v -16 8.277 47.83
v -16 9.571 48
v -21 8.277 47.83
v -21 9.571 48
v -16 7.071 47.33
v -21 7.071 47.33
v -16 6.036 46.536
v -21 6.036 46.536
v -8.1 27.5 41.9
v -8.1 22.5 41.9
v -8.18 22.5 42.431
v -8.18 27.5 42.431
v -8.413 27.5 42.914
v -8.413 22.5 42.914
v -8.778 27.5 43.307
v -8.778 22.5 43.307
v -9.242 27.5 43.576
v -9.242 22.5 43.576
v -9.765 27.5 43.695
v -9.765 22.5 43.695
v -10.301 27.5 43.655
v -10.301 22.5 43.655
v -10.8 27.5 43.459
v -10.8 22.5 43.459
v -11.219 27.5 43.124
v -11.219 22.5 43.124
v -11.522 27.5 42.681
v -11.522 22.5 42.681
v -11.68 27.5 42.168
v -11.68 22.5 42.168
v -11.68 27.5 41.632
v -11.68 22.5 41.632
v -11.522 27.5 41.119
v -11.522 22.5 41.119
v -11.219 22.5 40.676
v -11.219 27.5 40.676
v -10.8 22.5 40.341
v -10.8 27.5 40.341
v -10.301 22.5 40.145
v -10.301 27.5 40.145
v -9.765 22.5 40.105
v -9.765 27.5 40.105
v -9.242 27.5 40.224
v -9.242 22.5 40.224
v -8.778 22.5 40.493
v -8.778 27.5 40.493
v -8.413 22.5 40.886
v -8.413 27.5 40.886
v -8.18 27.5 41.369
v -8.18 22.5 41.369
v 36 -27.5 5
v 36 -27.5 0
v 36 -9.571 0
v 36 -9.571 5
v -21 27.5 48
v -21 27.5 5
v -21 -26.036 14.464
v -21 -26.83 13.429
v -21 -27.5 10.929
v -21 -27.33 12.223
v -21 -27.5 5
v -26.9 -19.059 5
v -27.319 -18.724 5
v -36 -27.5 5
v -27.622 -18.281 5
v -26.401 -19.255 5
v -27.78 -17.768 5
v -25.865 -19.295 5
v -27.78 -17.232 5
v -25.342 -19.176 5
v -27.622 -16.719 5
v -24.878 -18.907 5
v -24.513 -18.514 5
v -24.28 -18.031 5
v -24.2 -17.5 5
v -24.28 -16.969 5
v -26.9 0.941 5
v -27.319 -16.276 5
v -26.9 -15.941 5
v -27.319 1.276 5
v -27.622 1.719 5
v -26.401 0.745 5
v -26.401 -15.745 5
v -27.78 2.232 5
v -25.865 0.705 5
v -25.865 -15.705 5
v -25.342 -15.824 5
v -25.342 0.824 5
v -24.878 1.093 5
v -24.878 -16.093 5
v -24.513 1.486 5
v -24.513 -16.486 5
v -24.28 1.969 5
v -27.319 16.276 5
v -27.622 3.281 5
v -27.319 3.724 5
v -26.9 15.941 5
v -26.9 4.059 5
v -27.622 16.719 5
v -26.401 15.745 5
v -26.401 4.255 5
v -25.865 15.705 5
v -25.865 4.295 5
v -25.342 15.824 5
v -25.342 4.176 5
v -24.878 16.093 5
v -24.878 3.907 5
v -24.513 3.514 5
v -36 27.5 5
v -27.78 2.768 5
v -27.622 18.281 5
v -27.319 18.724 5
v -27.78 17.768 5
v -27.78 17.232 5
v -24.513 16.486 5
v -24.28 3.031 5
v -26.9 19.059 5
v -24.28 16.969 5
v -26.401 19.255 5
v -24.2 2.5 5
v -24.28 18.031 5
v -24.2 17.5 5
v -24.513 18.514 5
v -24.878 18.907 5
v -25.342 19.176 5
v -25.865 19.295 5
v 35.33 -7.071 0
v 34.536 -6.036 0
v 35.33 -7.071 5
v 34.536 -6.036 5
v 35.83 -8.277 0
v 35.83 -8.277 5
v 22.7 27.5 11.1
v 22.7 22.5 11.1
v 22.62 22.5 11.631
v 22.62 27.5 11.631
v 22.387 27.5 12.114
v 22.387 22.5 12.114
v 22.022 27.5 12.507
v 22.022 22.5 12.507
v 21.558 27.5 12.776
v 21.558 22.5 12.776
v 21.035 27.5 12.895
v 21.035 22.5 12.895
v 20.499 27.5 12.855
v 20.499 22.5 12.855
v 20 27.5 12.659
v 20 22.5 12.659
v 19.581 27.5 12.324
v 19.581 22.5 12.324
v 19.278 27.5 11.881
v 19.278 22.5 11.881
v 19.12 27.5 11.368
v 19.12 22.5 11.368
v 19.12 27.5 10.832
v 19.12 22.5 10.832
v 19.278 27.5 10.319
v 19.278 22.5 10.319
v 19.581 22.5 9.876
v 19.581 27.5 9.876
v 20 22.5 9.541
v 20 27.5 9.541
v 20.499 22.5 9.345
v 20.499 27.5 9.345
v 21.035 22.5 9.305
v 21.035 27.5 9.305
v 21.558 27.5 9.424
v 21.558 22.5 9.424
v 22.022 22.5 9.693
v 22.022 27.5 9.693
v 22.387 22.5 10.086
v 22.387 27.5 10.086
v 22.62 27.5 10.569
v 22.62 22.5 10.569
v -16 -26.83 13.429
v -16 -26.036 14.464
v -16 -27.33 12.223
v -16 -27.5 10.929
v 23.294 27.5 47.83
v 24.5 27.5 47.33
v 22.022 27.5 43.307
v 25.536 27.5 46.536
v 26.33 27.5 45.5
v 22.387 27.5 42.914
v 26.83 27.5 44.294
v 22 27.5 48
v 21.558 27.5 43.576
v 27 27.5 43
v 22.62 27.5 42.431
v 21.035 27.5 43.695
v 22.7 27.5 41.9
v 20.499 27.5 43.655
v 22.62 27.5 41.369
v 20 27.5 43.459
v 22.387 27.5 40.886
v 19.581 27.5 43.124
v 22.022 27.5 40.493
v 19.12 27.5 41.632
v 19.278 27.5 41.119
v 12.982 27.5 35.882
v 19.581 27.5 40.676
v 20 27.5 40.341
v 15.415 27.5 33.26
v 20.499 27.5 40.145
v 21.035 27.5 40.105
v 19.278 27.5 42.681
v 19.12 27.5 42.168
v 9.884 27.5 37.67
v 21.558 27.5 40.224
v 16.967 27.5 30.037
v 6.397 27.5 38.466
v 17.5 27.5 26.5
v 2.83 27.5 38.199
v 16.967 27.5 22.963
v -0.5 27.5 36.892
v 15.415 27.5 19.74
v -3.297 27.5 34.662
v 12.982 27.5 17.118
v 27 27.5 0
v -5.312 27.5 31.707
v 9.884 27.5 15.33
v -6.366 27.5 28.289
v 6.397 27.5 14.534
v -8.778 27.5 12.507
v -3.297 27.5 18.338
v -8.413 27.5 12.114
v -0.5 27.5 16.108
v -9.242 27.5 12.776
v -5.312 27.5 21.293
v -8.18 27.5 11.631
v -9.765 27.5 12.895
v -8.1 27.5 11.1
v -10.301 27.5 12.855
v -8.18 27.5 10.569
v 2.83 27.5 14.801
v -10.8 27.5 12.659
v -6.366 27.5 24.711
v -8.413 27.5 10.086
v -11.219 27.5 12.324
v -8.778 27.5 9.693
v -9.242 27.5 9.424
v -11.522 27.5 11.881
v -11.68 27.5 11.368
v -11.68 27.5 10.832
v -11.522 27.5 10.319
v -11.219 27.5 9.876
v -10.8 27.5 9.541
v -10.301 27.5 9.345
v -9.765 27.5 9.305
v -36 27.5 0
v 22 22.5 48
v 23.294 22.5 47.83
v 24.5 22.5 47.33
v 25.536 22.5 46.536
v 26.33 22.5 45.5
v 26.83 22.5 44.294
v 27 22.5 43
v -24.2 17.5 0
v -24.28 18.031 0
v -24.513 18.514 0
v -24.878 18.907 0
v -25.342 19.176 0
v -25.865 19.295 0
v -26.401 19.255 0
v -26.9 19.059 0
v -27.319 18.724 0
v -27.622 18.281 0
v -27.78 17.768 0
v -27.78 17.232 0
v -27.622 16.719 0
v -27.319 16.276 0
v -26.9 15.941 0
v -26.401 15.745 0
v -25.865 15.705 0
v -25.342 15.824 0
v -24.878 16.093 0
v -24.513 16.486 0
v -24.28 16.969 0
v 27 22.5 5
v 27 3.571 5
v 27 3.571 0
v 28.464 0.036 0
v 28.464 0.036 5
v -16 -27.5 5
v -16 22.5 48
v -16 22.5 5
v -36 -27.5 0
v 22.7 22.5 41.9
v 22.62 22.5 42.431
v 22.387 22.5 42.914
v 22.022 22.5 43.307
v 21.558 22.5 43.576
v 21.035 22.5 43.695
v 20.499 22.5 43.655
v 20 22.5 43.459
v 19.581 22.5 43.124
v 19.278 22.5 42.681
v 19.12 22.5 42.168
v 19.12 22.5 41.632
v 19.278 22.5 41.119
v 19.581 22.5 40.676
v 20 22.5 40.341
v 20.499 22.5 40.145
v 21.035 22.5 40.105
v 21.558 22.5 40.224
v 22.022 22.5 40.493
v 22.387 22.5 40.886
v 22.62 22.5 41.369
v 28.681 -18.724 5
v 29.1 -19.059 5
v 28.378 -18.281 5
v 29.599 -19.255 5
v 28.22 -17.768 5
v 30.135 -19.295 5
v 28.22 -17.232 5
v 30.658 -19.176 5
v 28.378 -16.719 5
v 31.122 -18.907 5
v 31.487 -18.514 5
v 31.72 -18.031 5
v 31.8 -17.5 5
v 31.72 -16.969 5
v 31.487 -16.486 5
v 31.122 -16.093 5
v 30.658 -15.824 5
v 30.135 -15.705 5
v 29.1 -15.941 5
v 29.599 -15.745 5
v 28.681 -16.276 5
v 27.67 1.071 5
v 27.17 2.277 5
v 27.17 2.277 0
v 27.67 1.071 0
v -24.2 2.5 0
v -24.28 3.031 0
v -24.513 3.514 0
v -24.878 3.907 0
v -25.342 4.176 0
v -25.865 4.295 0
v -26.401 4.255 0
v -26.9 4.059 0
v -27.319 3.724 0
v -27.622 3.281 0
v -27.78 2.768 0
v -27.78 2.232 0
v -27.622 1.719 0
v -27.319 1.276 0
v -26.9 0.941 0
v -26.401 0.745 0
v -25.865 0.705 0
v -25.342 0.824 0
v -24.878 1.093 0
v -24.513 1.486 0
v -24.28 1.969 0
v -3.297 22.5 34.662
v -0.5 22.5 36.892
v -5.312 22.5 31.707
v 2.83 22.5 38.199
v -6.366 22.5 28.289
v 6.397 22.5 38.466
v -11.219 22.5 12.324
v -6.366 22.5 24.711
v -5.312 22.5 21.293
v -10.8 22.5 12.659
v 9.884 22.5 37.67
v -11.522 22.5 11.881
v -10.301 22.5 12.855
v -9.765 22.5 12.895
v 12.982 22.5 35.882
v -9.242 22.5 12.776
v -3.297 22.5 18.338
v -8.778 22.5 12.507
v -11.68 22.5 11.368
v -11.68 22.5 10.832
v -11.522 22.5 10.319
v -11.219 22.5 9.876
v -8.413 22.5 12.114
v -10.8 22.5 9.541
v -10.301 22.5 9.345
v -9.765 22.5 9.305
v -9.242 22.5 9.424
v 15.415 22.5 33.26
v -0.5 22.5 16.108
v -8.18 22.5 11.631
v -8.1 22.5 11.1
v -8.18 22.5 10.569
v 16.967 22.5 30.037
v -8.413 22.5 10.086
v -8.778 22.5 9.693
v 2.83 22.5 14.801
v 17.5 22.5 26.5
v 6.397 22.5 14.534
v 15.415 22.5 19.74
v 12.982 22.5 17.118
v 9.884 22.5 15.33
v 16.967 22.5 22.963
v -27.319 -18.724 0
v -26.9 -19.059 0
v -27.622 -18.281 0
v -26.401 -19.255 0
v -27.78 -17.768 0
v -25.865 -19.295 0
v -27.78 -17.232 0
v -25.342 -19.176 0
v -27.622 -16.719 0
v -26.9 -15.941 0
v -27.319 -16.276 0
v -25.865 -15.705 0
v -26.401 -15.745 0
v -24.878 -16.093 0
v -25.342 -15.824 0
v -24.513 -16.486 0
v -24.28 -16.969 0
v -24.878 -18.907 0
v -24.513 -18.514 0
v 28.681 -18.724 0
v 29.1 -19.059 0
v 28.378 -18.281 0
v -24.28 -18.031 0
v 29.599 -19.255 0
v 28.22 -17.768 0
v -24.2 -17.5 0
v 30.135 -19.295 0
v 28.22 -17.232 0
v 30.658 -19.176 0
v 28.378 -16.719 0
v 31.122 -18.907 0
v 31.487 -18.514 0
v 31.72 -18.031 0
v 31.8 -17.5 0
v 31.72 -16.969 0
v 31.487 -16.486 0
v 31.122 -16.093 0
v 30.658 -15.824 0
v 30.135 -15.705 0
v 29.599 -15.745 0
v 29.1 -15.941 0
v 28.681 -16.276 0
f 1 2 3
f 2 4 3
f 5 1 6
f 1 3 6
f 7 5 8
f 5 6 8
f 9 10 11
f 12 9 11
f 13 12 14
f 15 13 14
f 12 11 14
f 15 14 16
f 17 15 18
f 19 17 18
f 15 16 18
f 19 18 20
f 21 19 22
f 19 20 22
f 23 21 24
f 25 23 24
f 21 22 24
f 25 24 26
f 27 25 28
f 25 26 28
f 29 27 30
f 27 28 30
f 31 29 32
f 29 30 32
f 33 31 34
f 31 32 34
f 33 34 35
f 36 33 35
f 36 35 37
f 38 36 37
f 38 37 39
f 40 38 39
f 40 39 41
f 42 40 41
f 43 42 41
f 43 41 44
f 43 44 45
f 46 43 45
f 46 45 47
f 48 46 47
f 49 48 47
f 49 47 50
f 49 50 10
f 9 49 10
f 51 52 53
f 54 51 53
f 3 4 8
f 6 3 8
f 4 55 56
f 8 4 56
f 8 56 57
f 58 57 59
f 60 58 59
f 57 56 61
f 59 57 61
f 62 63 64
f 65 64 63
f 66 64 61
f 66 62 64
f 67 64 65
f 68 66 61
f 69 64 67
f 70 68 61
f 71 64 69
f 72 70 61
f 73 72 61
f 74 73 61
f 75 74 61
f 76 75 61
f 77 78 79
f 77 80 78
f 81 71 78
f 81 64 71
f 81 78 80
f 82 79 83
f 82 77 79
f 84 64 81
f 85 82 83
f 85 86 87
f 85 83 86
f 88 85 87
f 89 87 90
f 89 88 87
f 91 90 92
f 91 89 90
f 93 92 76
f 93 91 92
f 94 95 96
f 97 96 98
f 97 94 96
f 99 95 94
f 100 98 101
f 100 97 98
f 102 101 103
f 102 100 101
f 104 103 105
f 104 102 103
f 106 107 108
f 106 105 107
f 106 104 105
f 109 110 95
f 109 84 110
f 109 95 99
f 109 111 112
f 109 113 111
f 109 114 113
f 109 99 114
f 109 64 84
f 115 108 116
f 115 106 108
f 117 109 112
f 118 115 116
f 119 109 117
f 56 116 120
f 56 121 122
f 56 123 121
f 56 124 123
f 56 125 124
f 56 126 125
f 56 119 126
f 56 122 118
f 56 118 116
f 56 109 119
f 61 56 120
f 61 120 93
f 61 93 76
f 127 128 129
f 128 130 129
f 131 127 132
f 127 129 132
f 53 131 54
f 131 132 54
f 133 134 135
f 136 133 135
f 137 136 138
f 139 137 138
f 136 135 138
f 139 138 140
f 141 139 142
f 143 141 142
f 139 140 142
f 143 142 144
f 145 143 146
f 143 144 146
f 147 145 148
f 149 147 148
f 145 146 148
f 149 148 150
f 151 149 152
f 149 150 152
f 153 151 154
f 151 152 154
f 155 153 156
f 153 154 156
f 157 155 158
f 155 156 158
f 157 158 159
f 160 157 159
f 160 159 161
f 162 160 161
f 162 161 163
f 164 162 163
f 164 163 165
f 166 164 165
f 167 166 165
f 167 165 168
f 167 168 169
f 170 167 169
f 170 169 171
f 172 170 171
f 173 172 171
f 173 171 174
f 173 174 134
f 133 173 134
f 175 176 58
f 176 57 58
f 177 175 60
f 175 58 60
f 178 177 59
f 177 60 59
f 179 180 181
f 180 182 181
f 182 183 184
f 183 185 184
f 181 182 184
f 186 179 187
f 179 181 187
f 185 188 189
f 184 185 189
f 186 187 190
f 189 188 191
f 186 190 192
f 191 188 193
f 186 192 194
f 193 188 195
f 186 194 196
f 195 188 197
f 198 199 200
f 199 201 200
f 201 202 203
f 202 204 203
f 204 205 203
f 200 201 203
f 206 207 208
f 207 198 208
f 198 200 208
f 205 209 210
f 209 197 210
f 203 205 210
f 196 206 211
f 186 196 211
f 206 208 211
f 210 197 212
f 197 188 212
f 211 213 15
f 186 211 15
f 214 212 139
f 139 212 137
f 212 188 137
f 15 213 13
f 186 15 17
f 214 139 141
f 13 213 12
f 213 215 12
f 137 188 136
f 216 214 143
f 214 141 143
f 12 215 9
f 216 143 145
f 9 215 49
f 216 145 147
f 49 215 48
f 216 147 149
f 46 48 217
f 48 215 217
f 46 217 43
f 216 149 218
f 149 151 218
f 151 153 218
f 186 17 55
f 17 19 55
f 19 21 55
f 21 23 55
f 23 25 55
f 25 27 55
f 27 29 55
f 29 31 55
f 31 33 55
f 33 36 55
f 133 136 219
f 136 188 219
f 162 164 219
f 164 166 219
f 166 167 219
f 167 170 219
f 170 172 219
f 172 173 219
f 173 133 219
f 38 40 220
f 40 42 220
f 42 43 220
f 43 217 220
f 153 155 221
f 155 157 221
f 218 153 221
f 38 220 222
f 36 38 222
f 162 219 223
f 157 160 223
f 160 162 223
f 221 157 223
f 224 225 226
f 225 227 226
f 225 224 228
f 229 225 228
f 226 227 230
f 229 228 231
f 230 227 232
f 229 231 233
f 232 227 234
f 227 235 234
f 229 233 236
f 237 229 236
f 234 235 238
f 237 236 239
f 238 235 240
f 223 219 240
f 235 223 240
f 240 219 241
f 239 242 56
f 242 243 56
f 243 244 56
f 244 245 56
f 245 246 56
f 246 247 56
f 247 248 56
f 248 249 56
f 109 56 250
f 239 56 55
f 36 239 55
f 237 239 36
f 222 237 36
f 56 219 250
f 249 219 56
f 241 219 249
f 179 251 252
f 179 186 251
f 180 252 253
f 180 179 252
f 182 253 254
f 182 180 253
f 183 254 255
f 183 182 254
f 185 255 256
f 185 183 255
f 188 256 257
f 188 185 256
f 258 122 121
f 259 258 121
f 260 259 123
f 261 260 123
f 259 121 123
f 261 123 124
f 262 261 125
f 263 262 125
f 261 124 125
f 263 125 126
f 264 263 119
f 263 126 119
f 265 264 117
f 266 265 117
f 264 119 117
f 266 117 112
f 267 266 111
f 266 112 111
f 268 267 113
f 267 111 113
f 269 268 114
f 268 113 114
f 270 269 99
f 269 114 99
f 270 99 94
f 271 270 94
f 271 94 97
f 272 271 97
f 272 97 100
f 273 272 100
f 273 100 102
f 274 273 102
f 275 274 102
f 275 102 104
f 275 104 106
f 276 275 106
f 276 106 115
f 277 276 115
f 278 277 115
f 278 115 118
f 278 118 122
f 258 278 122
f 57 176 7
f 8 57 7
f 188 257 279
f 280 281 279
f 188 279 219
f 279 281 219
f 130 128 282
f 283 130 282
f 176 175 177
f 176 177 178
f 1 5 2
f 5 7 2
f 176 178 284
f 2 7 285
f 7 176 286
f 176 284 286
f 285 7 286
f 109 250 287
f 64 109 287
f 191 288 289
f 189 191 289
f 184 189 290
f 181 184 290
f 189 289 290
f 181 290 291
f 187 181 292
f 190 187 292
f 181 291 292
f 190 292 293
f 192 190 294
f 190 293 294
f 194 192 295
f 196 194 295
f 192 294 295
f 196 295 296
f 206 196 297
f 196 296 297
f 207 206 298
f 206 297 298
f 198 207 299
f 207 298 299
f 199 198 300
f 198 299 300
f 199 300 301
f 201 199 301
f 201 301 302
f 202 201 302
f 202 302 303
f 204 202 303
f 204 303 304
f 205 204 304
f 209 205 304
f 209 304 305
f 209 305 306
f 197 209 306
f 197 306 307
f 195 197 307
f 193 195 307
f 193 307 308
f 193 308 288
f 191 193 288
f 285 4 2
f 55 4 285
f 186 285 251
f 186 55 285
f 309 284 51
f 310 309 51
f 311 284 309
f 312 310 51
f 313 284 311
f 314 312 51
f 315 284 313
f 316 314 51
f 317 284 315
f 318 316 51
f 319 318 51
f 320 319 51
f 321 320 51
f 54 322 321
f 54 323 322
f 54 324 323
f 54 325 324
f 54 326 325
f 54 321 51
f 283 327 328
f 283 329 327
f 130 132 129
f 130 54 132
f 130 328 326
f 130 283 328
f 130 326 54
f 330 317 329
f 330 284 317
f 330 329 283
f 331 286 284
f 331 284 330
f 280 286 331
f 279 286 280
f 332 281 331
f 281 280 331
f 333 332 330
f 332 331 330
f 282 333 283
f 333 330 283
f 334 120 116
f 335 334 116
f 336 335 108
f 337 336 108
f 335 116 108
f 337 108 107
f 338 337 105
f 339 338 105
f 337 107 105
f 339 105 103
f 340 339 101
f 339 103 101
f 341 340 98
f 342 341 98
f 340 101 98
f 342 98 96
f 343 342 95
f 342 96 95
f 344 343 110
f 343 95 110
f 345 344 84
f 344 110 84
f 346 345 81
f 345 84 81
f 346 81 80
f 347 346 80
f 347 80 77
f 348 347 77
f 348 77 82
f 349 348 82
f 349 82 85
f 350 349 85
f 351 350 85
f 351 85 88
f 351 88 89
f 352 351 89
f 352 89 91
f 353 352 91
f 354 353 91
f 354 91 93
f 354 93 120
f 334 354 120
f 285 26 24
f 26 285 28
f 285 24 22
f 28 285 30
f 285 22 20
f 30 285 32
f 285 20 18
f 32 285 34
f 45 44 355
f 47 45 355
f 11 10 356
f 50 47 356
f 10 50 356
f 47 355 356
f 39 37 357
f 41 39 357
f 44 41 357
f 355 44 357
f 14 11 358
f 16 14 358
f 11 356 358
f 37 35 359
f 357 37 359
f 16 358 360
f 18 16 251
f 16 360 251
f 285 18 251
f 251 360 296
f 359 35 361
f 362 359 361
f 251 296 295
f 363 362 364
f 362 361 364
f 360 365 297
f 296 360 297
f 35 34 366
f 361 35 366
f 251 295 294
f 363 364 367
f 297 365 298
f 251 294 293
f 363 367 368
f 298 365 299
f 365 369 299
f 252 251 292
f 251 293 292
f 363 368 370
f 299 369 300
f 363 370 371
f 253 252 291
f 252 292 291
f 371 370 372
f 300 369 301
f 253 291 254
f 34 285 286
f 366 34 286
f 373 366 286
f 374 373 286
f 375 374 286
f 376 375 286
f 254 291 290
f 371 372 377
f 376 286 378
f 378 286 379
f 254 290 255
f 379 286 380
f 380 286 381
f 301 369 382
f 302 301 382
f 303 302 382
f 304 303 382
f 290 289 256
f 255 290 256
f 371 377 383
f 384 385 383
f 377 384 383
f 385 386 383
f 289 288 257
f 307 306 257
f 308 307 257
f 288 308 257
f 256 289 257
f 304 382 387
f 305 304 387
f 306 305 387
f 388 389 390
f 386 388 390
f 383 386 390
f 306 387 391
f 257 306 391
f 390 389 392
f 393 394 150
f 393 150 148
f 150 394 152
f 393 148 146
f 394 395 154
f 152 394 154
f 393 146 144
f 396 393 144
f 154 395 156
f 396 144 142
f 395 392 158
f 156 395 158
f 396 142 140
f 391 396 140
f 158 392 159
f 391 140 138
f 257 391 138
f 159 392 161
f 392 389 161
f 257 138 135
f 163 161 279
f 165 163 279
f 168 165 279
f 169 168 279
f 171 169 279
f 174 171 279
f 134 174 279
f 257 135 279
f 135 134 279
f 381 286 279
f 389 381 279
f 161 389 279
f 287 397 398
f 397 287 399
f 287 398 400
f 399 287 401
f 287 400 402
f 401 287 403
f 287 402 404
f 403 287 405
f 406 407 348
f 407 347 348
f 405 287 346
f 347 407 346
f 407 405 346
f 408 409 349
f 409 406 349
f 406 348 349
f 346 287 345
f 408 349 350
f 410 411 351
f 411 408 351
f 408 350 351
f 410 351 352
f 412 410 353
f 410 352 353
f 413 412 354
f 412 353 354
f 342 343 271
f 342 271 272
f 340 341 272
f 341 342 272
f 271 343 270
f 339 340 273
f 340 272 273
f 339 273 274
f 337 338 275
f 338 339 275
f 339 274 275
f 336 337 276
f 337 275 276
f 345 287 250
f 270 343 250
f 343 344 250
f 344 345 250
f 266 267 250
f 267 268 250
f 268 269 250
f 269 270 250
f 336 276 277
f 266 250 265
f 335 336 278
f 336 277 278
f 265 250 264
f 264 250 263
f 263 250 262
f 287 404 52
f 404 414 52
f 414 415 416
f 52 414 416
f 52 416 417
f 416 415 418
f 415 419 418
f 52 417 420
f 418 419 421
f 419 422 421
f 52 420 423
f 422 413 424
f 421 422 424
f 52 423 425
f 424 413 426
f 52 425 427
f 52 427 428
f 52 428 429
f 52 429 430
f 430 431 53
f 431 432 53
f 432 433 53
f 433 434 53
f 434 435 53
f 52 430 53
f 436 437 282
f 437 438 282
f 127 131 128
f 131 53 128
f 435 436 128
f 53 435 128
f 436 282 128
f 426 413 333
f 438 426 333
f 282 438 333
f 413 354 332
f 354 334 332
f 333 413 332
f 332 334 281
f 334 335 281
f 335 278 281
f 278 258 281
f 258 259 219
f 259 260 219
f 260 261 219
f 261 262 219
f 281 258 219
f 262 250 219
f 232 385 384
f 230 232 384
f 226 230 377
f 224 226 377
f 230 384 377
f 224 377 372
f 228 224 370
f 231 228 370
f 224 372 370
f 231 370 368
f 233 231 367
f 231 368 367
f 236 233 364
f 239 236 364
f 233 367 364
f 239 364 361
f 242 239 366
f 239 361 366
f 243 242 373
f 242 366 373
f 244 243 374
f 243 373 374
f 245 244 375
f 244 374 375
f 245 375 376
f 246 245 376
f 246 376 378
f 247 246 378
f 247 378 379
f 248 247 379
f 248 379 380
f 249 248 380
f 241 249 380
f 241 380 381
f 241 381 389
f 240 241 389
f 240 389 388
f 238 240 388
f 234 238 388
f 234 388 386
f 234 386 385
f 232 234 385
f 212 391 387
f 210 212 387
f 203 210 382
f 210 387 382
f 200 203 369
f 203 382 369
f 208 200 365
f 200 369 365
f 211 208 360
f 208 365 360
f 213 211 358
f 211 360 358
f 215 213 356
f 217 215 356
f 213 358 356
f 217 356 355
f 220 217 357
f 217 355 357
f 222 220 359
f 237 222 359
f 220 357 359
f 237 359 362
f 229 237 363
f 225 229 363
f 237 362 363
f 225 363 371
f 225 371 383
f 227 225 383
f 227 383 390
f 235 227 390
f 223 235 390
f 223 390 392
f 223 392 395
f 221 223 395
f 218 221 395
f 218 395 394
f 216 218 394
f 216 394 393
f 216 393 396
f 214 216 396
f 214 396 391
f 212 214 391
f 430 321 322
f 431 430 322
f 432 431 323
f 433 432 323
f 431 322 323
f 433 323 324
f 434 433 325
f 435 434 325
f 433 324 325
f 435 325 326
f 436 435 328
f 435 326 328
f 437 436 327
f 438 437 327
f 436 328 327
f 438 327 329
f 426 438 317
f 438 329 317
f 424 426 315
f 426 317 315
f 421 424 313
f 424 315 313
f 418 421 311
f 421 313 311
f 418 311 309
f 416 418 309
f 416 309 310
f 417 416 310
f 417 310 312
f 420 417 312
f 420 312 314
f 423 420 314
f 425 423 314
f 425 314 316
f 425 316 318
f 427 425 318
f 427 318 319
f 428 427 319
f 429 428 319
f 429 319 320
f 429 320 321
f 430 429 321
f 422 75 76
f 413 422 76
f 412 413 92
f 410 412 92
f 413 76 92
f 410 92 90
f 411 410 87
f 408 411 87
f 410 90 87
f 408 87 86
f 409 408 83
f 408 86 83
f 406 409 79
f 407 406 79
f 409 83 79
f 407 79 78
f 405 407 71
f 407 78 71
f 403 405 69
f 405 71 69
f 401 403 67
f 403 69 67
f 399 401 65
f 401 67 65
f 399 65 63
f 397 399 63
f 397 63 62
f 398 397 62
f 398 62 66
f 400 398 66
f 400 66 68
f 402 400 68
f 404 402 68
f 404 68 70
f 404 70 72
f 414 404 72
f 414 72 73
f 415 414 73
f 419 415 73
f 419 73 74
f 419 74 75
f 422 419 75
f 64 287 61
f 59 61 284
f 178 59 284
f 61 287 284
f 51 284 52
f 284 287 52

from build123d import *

# Parameters (mm, degrees)
F1_DEPTH = 5
F2_R     = 1.8
F3_DEPTH = 25
F5_DEPTH = 43
F7_DEPTH = 25
F8_R     = 12
F8_R_2   = 1.8
F9_DEPTH = 25
F10_R    = 5


with BuildPart() as f1:
    # F0 (on Top) → F1 (new body)
    with BuildSketch(Plane.XY):
        Polygon((-36, 27.5), (-36, -27.5), (36, -27.5), (36, -7.5), (27, 1.5), (27, 27.5), align=None)
    extrude(amount=F1_DEPTH)

    # F2 (on face) → F3 (cut)
    with BuildSketch(Plane.XY.offset(5)):
        with Locations((-26, 17.5)):
            Circle(F2_R)
        with Locations((-26, 2.5)):
            Circle(F2_R)
        with Locations((-26, -17.5)):
            Circle(F2_R)
        with Locations((30, -17.5)):
            Circle(F2_R)
    extrude(amount=-F3_DEPTH, mode=Mode.SUBTRACT)

    # F4 (on face) → F5 (join)
    with BuildSketch(Plane.XY.offset(5)):
        Polygon((-16, 22.5), (27, 22.5), (27, 27.5), (-21, 27.5), (-21, -27.5), (-16, -27.5), align=None)
    extrude(amount=F5_DEPTH)

    # F6 (on face) → F7 (cut)
    with BuildSketch(Plane.YZ.offset(-16)):
        Polygon((-27.5, 13), (7.5, 48), (-27.5, 48), align=None)
    extrude(amount=-F7_DEPTH, mode=Mode.SUBTRACT)

    # F8 (on face) → F9 (cut)
    with BuildSketch(Plane.XZ.offset(-22.5)):
        with Locations((5.5, 26.5)):
            Circle(F8_R)
        with Locations((-9.9, 41.9)):
            Circle(F8_R_2)
        with Locations((-9.9, 11.1)):
            Circle(F8_R_2)
        with Locations((20.9, 41.9)):
            Circle(F8_R_2)
        with Locations((20.9, 11.1)):
            Circle(F8_R_2)
    extrude(amount=-F9_DEPTH, mode=Mode.SUBTRACT)

    # F10
    f10_edges = [f1.edges().sort_by_distance(p)[0] for p in [
        (-18.5, 7.5, 48),
        (-18.5, -27.5, 13),
        (27, 25, 48),
        (36, -7.5, 2.5),
        (27, 1.5, 2.5),
    ]]
    fillet(f10_edges, radius=F10_R)


solid = f1.part
